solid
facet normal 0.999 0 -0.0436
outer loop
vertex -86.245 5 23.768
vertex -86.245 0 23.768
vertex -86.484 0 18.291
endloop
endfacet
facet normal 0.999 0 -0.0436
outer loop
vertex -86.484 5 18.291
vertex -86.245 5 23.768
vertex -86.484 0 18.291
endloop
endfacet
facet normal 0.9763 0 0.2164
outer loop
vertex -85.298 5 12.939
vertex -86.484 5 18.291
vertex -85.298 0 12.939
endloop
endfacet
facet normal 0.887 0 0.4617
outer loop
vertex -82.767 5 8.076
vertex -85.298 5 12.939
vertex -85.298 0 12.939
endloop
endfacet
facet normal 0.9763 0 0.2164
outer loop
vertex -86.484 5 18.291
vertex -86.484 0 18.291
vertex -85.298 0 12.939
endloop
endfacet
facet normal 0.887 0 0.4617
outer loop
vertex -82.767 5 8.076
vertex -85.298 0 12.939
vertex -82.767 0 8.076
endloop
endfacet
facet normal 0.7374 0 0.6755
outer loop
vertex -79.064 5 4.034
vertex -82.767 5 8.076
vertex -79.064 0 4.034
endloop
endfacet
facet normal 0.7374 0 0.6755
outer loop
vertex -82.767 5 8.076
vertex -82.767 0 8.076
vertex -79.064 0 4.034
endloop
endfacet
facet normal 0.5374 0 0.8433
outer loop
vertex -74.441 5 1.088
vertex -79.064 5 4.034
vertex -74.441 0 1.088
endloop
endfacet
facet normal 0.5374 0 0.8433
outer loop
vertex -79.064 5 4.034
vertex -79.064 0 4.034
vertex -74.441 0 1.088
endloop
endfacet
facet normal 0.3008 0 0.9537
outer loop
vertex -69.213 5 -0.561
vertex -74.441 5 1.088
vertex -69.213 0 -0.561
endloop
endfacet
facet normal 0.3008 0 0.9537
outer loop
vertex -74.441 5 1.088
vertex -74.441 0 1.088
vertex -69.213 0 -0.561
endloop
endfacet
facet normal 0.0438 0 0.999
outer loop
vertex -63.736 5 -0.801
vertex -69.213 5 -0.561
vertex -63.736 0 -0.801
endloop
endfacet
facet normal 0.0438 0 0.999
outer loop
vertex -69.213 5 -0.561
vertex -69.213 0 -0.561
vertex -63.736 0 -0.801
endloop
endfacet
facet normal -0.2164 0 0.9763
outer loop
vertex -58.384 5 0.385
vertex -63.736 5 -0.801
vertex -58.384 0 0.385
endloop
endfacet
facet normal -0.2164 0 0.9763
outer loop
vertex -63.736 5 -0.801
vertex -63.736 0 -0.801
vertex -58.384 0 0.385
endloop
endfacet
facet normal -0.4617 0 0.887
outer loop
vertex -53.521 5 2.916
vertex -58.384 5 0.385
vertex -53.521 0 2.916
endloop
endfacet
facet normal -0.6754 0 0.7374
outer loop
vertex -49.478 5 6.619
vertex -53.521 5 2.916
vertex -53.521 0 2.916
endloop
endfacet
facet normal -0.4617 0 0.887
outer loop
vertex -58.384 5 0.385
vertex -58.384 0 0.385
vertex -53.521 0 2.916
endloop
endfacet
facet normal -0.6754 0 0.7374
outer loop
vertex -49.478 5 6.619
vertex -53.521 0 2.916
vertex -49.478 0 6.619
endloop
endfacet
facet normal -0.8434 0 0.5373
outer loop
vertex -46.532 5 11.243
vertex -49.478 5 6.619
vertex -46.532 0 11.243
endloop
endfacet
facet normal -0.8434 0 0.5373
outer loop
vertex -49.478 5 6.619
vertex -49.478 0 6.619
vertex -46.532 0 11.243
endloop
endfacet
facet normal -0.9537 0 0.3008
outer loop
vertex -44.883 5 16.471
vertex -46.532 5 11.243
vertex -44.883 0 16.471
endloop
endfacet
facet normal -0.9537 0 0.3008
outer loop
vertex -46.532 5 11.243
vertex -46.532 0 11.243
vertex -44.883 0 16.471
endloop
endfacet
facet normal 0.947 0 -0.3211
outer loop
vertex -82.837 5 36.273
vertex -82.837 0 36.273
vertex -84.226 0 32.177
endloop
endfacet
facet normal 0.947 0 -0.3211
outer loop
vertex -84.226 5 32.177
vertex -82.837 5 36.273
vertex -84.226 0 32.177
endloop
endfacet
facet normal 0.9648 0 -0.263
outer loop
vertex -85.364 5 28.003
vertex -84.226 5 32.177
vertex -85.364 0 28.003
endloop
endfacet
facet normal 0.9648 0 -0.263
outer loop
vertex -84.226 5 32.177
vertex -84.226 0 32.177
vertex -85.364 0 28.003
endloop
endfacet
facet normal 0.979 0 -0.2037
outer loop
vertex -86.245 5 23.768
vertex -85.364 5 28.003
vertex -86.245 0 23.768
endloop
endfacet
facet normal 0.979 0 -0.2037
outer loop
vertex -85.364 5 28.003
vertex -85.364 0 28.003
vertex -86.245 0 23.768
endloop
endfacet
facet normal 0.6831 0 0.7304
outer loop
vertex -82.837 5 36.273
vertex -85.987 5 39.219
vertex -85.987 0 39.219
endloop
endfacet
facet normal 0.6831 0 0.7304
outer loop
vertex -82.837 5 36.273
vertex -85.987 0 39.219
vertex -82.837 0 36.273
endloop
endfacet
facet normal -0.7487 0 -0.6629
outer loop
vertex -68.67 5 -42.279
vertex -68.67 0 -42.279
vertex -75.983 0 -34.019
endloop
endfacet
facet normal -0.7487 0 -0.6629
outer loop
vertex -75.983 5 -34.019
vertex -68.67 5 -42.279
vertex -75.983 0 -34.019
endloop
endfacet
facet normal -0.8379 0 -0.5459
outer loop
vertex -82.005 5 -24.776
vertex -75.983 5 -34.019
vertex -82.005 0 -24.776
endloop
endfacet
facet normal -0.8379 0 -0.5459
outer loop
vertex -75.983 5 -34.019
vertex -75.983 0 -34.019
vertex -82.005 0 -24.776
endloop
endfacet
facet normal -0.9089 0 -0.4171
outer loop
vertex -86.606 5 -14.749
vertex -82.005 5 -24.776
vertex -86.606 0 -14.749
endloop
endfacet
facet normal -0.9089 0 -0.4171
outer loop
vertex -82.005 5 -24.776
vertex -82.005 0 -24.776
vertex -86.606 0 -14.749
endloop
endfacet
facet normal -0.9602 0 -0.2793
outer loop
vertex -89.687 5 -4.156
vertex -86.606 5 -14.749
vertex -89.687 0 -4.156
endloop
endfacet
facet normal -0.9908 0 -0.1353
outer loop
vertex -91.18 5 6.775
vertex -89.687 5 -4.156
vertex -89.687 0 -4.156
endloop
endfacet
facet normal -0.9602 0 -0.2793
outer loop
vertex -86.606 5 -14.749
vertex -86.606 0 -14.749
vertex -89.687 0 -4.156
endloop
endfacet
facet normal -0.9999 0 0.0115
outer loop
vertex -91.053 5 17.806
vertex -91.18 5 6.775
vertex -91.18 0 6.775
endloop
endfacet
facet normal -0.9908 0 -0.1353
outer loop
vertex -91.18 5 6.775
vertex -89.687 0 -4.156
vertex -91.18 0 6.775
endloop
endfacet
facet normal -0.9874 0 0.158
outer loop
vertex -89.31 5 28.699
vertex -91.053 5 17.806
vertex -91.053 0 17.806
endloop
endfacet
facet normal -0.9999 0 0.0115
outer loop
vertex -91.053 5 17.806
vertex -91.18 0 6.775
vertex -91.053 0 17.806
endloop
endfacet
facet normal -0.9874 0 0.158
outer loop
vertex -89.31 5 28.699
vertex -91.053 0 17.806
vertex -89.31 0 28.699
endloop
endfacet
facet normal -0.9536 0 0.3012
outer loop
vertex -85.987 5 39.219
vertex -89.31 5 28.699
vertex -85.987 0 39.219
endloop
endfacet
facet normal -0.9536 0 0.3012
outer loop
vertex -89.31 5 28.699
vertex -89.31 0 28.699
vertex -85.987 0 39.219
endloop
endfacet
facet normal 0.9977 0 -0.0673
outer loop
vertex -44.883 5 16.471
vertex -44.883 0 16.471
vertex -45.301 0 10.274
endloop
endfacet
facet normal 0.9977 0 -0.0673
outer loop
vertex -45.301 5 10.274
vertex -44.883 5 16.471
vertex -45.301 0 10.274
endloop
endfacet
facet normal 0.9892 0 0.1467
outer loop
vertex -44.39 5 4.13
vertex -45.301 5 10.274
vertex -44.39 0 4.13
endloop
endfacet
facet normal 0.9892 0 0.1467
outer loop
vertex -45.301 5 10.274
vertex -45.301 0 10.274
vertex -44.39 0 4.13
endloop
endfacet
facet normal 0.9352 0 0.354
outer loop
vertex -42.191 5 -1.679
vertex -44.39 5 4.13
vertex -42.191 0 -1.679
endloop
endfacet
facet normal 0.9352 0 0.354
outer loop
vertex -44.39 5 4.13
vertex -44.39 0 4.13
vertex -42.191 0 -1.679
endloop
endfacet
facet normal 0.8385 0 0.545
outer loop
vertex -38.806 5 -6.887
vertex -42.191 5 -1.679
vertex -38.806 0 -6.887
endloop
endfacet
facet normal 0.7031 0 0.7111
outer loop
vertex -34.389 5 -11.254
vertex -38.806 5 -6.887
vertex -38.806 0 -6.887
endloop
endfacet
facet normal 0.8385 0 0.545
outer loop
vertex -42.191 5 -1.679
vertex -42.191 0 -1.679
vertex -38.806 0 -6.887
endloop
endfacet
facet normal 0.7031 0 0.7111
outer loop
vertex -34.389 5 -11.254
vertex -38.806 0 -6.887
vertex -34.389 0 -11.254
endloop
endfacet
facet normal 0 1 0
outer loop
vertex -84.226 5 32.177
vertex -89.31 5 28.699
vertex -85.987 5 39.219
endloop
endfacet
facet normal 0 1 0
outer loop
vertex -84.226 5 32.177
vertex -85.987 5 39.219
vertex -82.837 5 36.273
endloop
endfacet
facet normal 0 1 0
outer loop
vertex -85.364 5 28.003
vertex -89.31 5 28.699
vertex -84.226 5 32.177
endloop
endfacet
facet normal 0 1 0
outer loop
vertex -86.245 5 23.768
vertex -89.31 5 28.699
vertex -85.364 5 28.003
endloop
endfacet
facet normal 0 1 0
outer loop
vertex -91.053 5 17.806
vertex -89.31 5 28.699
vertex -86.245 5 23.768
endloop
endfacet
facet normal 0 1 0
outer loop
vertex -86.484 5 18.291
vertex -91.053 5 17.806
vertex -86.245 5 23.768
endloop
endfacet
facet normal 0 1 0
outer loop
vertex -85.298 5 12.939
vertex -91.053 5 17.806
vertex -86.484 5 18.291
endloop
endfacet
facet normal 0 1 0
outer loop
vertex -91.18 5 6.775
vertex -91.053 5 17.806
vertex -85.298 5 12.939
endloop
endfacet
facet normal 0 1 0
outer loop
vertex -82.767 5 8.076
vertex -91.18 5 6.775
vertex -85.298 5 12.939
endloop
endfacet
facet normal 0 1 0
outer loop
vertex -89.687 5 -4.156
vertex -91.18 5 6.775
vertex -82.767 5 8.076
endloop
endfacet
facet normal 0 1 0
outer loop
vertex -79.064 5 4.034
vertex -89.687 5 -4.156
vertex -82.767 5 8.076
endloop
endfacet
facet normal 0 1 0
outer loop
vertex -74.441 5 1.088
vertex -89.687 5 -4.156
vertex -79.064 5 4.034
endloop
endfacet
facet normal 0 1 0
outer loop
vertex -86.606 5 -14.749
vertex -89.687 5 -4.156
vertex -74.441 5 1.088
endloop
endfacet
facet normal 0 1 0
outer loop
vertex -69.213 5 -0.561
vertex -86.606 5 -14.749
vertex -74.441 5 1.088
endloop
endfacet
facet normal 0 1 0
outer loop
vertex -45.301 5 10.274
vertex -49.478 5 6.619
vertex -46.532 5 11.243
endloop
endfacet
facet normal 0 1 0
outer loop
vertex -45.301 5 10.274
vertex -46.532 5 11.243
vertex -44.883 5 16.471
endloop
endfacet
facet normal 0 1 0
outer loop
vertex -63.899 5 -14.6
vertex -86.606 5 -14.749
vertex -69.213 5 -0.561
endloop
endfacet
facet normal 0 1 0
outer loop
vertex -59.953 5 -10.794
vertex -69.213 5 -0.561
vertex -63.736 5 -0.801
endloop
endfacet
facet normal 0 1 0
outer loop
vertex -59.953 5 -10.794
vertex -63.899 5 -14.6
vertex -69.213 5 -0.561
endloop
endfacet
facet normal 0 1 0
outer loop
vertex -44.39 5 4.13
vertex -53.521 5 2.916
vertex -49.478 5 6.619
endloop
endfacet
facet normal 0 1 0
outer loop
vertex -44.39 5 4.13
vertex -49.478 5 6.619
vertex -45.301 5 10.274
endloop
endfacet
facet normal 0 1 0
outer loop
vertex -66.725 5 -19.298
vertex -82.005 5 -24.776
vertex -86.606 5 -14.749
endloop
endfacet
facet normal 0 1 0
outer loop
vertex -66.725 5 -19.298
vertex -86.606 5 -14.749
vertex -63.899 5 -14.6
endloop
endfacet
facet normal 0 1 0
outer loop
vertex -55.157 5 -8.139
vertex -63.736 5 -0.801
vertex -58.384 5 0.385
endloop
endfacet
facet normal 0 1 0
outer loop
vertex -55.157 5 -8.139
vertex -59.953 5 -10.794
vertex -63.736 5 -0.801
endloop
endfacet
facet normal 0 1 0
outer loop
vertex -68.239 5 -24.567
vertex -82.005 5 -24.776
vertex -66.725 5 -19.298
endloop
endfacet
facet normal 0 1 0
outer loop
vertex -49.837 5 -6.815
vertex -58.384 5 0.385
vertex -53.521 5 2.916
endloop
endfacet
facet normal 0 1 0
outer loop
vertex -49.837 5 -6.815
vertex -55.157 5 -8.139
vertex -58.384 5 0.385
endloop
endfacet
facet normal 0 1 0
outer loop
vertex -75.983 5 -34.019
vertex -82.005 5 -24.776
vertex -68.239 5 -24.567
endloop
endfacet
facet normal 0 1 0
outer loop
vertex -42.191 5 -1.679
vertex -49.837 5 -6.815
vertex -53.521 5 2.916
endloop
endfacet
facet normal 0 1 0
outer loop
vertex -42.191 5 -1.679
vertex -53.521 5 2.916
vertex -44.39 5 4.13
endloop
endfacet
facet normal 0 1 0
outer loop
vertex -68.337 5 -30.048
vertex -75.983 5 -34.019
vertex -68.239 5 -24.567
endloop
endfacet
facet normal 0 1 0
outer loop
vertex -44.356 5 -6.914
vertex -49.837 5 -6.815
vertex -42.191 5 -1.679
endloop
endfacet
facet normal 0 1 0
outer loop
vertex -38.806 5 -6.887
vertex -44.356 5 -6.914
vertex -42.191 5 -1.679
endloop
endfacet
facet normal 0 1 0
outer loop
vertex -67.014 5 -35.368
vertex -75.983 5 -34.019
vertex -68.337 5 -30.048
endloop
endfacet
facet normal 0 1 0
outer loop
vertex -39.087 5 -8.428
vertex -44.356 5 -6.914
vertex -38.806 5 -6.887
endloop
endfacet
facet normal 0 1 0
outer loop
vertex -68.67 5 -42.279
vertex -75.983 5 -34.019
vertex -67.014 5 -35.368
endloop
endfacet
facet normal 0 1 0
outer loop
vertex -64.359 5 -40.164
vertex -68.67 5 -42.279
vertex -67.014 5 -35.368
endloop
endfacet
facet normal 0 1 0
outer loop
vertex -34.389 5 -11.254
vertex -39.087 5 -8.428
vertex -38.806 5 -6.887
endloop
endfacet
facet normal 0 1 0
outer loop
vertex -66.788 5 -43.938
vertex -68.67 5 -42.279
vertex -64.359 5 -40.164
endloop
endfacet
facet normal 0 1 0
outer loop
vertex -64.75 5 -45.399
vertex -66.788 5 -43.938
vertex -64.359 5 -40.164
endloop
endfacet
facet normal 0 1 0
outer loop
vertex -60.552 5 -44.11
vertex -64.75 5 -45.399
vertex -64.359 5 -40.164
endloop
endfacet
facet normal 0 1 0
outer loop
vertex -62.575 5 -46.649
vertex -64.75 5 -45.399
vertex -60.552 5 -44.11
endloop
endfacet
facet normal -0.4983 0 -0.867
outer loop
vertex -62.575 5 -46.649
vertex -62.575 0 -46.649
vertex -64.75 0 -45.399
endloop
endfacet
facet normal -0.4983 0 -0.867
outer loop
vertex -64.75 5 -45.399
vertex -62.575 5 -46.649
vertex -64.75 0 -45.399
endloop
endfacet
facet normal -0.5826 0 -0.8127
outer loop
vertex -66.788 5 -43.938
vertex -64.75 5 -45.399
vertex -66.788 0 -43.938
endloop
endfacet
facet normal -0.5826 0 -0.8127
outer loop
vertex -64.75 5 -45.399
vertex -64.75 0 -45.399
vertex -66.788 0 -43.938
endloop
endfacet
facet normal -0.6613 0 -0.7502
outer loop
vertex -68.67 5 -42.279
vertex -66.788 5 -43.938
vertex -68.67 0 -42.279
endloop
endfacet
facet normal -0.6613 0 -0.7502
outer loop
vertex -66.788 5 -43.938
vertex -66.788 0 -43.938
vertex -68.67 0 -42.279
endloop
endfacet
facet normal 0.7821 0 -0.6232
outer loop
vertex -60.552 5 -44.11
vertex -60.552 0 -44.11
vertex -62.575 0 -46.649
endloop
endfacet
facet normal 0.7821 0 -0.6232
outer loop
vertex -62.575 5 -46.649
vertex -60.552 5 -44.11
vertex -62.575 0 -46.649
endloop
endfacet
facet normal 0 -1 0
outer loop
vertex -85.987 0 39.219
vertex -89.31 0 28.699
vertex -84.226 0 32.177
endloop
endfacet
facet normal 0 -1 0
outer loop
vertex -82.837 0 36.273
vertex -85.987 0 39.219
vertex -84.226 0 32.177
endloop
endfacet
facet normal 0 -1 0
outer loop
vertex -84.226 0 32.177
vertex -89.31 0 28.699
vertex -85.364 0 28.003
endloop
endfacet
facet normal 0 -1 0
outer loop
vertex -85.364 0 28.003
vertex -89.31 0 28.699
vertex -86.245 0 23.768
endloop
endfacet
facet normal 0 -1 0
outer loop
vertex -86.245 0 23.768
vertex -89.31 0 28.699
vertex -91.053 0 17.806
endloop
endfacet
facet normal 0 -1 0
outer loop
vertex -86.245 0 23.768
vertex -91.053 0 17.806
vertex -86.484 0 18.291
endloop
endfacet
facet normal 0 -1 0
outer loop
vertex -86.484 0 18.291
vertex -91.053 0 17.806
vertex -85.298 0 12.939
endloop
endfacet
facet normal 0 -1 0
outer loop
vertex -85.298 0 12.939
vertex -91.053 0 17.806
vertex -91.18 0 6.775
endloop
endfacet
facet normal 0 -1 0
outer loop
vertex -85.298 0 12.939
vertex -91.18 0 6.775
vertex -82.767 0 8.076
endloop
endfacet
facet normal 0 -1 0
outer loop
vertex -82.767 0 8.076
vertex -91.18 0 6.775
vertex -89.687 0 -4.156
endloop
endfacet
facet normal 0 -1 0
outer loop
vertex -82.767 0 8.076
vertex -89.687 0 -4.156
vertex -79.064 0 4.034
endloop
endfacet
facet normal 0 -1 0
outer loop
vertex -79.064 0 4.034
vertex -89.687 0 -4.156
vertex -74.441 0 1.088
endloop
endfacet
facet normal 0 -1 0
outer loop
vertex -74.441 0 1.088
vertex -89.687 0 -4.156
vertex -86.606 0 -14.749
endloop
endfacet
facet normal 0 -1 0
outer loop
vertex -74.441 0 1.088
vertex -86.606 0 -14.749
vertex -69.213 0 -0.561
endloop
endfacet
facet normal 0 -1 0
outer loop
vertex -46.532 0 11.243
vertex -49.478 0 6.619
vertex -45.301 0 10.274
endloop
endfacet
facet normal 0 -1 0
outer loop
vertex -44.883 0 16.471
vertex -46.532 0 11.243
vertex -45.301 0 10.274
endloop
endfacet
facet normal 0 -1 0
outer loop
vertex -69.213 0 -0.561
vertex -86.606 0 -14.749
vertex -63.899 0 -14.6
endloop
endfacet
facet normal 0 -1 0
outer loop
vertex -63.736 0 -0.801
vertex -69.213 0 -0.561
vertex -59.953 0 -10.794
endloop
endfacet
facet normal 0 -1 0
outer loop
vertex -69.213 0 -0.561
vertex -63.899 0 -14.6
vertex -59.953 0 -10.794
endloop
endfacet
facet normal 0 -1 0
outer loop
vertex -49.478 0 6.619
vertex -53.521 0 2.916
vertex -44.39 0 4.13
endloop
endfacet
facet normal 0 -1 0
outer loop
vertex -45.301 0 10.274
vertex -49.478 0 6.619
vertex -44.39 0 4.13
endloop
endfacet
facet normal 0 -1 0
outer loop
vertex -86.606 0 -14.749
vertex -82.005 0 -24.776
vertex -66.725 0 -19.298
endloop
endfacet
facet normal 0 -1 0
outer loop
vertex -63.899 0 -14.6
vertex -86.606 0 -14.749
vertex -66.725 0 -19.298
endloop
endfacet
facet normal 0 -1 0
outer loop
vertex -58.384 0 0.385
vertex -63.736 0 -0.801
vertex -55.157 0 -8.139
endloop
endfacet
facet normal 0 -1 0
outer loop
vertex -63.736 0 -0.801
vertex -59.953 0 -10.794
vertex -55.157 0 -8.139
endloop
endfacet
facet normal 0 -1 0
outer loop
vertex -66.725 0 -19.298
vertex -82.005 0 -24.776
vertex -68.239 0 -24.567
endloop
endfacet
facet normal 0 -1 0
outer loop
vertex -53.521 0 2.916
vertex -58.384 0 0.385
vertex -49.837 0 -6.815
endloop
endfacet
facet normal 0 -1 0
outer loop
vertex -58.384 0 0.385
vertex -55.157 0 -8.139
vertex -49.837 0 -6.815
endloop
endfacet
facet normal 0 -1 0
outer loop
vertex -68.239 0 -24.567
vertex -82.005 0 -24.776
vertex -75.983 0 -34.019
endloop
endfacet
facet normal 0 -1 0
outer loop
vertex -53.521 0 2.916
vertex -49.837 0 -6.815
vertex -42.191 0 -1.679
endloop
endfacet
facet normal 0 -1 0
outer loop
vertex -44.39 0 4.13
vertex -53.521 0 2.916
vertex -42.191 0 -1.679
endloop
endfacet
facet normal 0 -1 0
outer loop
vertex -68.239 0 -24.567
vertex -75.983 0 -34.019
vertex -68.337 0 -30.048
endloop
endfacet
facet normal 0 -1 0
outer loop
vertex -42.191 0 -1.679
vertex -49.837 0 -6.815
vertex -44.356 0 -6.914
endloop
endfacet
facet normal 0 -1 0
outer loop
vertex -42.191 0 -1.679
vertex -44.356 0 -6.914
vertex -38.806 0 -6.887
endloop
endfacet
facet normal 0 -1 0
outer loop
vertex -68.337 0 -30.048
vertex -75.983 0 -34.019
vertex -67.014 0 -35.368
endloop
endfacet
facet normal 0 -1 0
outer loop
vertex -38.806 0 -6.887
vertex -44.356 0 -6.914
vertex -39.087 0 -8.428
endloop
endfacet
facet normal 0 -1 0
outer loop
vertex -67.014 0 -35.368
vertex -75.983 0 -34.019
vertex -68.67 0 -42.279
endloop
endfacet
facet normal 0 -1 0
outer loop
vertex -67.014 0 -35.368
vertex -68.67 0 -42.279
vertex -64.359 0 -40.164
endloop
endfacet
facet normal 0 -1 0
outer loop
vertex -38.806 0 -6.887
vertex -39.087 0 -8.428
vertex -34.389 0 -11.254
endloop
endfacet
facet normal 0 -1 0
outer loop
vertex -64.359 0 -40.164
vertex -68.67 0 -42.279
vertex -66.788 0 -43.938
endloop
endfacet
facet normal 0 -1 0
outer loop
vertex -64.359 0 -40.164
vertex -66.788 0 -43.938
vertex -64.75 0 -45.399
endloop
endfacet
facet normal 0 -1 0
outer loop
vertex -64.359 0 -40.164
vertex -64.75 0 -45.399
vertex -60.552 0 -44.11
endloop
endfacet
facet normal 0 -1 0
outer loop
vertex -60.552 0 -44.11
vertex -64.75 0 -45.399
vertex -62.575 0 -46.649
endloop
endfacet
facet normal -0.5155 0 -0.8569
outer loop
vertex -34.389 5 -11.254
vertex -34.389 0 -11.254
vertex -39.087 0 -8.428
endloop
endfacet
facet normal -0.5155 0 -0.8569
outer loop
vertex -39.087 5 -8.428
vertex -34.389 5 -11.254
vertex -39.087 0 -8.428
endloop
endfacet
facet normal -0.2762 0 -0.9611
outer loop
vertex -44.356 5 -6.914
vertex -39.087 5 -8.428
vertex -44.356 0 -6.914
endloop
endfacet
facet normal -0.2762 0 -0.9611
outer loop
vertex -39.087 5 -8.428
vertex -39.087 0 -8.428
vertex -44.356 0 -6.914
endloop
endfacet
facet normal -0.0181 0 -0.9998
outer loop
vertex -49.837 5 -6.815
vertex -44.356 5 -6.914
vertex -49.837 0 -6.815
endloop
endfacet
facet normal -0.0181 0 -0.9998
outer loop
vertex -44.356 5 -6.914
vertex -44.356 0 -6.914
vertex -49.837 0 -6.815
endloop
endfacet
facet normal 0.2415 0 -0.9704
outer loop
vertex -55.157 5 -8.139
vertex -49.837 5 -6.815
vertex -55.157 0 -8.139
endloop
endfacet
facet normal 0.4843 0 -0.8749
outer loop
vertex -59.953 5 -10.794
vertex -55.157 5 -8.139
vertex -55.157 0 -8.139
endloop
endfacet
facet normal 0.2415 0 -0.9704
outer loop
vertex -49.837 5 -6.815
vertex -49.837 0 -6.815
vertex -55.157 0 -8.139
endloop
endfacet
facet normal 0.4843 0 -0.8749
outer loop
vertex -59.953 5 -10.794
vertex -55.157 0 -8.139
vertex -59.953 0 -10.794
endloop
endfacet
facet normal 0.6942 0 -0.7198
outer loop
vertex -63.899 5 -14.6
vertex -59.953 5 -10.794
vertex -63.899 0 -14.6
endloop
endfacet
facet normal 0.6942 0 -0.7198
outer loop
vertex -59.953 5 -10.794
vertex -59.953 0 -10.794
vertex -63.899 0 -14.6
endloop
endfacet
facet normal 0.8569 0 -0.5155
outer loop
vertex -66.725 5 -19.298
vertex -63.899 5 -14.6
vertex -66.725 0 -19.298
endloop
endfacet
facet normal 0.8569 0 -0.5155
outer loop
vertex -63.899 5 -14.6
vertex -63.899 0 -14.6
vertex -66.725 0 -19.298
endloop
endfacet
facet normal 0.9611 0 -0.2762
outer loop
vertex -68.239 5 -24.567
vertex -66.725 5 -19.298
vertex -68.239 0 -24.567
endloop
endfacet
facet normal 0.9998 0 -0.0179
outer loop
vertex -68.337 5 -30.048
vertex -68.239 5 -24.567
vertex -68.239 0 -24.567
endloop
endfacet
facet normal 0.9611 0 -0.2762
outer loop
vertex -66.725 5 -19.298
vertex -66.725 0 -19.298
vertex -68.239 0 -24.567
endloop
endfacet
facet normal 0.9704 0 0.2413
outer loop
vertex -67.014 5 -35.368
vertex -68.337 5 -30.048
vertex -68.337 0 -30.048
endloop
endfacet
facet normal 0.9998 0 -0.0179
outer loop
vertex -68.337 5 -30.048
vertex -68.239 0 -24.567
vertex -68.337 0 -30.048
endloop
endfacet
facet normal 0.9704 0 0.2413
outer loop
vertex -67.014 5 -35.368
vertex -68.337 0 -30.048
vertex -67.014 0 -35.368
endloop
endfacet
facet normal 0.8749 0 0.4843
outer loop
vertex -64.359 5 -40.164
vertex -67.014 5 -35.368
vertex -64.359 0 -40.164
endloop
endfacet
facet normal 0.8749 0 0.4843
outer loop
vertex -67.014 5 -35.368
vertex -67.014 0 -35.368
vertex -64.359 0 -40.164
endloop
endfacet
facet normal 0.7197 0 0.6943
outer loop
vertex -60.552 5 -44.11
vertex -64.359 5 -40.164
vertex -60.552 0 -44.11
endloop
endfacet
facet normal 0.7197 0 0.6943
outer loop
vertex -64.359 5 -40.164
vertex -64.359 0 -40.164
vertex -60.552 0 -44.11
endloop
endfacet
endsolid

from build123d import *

# Parameters (mm, degrees)
BOSS_EXTRU_1_DEPTH = 5


with BuildPart() as part:
    # Esquisse1 → Boss.-Extru.1 (new body)
    with BuildSketch(Plane(origin=(0, 0, 0), x_dir=(1, 0, 0), z_dir=(0, 1, 0))):
        with BuildLine():
            ThreePointArc((-68.670306383, 42.279177512), (-89.686678349, 4.155942482), (-85.987250464, -39.218971617))
            Line((-85.987250464, -39.218971617), (-82.83716136, -36.273074377))
            ThreePointArc((-82.83716136, -36.273074377), (-84.826823628, -30.09859374), (-86.244619049, -23.768283856))
            ThreePointArc((-86.244619049, -23.768283856), (-69.212709026, 0.560999754), (-44.883425416, -16.470910269))
            ThreePointArc((-44.883425416, -16.470910269), (-43.446659296, -1.166342783), (-34.389436177, 11.253834034))
            ThreePointArc((-34.389436177, 11.253834034), (-63.898789522, 14.600185058), (-60.552438498, 44.109538403))
            Line((-60.552438498, 44.109538403), (-62.574572693, 46.648950451))
            ThreePointArc((-62.574572693, 46.648950451), (-65.787242564, 44.693960448), (-68.670306383, 42.279177512))
        make_face()
    extrude(amount=BOSS_EXTRU_1_DEPTH)


solid = part.part
